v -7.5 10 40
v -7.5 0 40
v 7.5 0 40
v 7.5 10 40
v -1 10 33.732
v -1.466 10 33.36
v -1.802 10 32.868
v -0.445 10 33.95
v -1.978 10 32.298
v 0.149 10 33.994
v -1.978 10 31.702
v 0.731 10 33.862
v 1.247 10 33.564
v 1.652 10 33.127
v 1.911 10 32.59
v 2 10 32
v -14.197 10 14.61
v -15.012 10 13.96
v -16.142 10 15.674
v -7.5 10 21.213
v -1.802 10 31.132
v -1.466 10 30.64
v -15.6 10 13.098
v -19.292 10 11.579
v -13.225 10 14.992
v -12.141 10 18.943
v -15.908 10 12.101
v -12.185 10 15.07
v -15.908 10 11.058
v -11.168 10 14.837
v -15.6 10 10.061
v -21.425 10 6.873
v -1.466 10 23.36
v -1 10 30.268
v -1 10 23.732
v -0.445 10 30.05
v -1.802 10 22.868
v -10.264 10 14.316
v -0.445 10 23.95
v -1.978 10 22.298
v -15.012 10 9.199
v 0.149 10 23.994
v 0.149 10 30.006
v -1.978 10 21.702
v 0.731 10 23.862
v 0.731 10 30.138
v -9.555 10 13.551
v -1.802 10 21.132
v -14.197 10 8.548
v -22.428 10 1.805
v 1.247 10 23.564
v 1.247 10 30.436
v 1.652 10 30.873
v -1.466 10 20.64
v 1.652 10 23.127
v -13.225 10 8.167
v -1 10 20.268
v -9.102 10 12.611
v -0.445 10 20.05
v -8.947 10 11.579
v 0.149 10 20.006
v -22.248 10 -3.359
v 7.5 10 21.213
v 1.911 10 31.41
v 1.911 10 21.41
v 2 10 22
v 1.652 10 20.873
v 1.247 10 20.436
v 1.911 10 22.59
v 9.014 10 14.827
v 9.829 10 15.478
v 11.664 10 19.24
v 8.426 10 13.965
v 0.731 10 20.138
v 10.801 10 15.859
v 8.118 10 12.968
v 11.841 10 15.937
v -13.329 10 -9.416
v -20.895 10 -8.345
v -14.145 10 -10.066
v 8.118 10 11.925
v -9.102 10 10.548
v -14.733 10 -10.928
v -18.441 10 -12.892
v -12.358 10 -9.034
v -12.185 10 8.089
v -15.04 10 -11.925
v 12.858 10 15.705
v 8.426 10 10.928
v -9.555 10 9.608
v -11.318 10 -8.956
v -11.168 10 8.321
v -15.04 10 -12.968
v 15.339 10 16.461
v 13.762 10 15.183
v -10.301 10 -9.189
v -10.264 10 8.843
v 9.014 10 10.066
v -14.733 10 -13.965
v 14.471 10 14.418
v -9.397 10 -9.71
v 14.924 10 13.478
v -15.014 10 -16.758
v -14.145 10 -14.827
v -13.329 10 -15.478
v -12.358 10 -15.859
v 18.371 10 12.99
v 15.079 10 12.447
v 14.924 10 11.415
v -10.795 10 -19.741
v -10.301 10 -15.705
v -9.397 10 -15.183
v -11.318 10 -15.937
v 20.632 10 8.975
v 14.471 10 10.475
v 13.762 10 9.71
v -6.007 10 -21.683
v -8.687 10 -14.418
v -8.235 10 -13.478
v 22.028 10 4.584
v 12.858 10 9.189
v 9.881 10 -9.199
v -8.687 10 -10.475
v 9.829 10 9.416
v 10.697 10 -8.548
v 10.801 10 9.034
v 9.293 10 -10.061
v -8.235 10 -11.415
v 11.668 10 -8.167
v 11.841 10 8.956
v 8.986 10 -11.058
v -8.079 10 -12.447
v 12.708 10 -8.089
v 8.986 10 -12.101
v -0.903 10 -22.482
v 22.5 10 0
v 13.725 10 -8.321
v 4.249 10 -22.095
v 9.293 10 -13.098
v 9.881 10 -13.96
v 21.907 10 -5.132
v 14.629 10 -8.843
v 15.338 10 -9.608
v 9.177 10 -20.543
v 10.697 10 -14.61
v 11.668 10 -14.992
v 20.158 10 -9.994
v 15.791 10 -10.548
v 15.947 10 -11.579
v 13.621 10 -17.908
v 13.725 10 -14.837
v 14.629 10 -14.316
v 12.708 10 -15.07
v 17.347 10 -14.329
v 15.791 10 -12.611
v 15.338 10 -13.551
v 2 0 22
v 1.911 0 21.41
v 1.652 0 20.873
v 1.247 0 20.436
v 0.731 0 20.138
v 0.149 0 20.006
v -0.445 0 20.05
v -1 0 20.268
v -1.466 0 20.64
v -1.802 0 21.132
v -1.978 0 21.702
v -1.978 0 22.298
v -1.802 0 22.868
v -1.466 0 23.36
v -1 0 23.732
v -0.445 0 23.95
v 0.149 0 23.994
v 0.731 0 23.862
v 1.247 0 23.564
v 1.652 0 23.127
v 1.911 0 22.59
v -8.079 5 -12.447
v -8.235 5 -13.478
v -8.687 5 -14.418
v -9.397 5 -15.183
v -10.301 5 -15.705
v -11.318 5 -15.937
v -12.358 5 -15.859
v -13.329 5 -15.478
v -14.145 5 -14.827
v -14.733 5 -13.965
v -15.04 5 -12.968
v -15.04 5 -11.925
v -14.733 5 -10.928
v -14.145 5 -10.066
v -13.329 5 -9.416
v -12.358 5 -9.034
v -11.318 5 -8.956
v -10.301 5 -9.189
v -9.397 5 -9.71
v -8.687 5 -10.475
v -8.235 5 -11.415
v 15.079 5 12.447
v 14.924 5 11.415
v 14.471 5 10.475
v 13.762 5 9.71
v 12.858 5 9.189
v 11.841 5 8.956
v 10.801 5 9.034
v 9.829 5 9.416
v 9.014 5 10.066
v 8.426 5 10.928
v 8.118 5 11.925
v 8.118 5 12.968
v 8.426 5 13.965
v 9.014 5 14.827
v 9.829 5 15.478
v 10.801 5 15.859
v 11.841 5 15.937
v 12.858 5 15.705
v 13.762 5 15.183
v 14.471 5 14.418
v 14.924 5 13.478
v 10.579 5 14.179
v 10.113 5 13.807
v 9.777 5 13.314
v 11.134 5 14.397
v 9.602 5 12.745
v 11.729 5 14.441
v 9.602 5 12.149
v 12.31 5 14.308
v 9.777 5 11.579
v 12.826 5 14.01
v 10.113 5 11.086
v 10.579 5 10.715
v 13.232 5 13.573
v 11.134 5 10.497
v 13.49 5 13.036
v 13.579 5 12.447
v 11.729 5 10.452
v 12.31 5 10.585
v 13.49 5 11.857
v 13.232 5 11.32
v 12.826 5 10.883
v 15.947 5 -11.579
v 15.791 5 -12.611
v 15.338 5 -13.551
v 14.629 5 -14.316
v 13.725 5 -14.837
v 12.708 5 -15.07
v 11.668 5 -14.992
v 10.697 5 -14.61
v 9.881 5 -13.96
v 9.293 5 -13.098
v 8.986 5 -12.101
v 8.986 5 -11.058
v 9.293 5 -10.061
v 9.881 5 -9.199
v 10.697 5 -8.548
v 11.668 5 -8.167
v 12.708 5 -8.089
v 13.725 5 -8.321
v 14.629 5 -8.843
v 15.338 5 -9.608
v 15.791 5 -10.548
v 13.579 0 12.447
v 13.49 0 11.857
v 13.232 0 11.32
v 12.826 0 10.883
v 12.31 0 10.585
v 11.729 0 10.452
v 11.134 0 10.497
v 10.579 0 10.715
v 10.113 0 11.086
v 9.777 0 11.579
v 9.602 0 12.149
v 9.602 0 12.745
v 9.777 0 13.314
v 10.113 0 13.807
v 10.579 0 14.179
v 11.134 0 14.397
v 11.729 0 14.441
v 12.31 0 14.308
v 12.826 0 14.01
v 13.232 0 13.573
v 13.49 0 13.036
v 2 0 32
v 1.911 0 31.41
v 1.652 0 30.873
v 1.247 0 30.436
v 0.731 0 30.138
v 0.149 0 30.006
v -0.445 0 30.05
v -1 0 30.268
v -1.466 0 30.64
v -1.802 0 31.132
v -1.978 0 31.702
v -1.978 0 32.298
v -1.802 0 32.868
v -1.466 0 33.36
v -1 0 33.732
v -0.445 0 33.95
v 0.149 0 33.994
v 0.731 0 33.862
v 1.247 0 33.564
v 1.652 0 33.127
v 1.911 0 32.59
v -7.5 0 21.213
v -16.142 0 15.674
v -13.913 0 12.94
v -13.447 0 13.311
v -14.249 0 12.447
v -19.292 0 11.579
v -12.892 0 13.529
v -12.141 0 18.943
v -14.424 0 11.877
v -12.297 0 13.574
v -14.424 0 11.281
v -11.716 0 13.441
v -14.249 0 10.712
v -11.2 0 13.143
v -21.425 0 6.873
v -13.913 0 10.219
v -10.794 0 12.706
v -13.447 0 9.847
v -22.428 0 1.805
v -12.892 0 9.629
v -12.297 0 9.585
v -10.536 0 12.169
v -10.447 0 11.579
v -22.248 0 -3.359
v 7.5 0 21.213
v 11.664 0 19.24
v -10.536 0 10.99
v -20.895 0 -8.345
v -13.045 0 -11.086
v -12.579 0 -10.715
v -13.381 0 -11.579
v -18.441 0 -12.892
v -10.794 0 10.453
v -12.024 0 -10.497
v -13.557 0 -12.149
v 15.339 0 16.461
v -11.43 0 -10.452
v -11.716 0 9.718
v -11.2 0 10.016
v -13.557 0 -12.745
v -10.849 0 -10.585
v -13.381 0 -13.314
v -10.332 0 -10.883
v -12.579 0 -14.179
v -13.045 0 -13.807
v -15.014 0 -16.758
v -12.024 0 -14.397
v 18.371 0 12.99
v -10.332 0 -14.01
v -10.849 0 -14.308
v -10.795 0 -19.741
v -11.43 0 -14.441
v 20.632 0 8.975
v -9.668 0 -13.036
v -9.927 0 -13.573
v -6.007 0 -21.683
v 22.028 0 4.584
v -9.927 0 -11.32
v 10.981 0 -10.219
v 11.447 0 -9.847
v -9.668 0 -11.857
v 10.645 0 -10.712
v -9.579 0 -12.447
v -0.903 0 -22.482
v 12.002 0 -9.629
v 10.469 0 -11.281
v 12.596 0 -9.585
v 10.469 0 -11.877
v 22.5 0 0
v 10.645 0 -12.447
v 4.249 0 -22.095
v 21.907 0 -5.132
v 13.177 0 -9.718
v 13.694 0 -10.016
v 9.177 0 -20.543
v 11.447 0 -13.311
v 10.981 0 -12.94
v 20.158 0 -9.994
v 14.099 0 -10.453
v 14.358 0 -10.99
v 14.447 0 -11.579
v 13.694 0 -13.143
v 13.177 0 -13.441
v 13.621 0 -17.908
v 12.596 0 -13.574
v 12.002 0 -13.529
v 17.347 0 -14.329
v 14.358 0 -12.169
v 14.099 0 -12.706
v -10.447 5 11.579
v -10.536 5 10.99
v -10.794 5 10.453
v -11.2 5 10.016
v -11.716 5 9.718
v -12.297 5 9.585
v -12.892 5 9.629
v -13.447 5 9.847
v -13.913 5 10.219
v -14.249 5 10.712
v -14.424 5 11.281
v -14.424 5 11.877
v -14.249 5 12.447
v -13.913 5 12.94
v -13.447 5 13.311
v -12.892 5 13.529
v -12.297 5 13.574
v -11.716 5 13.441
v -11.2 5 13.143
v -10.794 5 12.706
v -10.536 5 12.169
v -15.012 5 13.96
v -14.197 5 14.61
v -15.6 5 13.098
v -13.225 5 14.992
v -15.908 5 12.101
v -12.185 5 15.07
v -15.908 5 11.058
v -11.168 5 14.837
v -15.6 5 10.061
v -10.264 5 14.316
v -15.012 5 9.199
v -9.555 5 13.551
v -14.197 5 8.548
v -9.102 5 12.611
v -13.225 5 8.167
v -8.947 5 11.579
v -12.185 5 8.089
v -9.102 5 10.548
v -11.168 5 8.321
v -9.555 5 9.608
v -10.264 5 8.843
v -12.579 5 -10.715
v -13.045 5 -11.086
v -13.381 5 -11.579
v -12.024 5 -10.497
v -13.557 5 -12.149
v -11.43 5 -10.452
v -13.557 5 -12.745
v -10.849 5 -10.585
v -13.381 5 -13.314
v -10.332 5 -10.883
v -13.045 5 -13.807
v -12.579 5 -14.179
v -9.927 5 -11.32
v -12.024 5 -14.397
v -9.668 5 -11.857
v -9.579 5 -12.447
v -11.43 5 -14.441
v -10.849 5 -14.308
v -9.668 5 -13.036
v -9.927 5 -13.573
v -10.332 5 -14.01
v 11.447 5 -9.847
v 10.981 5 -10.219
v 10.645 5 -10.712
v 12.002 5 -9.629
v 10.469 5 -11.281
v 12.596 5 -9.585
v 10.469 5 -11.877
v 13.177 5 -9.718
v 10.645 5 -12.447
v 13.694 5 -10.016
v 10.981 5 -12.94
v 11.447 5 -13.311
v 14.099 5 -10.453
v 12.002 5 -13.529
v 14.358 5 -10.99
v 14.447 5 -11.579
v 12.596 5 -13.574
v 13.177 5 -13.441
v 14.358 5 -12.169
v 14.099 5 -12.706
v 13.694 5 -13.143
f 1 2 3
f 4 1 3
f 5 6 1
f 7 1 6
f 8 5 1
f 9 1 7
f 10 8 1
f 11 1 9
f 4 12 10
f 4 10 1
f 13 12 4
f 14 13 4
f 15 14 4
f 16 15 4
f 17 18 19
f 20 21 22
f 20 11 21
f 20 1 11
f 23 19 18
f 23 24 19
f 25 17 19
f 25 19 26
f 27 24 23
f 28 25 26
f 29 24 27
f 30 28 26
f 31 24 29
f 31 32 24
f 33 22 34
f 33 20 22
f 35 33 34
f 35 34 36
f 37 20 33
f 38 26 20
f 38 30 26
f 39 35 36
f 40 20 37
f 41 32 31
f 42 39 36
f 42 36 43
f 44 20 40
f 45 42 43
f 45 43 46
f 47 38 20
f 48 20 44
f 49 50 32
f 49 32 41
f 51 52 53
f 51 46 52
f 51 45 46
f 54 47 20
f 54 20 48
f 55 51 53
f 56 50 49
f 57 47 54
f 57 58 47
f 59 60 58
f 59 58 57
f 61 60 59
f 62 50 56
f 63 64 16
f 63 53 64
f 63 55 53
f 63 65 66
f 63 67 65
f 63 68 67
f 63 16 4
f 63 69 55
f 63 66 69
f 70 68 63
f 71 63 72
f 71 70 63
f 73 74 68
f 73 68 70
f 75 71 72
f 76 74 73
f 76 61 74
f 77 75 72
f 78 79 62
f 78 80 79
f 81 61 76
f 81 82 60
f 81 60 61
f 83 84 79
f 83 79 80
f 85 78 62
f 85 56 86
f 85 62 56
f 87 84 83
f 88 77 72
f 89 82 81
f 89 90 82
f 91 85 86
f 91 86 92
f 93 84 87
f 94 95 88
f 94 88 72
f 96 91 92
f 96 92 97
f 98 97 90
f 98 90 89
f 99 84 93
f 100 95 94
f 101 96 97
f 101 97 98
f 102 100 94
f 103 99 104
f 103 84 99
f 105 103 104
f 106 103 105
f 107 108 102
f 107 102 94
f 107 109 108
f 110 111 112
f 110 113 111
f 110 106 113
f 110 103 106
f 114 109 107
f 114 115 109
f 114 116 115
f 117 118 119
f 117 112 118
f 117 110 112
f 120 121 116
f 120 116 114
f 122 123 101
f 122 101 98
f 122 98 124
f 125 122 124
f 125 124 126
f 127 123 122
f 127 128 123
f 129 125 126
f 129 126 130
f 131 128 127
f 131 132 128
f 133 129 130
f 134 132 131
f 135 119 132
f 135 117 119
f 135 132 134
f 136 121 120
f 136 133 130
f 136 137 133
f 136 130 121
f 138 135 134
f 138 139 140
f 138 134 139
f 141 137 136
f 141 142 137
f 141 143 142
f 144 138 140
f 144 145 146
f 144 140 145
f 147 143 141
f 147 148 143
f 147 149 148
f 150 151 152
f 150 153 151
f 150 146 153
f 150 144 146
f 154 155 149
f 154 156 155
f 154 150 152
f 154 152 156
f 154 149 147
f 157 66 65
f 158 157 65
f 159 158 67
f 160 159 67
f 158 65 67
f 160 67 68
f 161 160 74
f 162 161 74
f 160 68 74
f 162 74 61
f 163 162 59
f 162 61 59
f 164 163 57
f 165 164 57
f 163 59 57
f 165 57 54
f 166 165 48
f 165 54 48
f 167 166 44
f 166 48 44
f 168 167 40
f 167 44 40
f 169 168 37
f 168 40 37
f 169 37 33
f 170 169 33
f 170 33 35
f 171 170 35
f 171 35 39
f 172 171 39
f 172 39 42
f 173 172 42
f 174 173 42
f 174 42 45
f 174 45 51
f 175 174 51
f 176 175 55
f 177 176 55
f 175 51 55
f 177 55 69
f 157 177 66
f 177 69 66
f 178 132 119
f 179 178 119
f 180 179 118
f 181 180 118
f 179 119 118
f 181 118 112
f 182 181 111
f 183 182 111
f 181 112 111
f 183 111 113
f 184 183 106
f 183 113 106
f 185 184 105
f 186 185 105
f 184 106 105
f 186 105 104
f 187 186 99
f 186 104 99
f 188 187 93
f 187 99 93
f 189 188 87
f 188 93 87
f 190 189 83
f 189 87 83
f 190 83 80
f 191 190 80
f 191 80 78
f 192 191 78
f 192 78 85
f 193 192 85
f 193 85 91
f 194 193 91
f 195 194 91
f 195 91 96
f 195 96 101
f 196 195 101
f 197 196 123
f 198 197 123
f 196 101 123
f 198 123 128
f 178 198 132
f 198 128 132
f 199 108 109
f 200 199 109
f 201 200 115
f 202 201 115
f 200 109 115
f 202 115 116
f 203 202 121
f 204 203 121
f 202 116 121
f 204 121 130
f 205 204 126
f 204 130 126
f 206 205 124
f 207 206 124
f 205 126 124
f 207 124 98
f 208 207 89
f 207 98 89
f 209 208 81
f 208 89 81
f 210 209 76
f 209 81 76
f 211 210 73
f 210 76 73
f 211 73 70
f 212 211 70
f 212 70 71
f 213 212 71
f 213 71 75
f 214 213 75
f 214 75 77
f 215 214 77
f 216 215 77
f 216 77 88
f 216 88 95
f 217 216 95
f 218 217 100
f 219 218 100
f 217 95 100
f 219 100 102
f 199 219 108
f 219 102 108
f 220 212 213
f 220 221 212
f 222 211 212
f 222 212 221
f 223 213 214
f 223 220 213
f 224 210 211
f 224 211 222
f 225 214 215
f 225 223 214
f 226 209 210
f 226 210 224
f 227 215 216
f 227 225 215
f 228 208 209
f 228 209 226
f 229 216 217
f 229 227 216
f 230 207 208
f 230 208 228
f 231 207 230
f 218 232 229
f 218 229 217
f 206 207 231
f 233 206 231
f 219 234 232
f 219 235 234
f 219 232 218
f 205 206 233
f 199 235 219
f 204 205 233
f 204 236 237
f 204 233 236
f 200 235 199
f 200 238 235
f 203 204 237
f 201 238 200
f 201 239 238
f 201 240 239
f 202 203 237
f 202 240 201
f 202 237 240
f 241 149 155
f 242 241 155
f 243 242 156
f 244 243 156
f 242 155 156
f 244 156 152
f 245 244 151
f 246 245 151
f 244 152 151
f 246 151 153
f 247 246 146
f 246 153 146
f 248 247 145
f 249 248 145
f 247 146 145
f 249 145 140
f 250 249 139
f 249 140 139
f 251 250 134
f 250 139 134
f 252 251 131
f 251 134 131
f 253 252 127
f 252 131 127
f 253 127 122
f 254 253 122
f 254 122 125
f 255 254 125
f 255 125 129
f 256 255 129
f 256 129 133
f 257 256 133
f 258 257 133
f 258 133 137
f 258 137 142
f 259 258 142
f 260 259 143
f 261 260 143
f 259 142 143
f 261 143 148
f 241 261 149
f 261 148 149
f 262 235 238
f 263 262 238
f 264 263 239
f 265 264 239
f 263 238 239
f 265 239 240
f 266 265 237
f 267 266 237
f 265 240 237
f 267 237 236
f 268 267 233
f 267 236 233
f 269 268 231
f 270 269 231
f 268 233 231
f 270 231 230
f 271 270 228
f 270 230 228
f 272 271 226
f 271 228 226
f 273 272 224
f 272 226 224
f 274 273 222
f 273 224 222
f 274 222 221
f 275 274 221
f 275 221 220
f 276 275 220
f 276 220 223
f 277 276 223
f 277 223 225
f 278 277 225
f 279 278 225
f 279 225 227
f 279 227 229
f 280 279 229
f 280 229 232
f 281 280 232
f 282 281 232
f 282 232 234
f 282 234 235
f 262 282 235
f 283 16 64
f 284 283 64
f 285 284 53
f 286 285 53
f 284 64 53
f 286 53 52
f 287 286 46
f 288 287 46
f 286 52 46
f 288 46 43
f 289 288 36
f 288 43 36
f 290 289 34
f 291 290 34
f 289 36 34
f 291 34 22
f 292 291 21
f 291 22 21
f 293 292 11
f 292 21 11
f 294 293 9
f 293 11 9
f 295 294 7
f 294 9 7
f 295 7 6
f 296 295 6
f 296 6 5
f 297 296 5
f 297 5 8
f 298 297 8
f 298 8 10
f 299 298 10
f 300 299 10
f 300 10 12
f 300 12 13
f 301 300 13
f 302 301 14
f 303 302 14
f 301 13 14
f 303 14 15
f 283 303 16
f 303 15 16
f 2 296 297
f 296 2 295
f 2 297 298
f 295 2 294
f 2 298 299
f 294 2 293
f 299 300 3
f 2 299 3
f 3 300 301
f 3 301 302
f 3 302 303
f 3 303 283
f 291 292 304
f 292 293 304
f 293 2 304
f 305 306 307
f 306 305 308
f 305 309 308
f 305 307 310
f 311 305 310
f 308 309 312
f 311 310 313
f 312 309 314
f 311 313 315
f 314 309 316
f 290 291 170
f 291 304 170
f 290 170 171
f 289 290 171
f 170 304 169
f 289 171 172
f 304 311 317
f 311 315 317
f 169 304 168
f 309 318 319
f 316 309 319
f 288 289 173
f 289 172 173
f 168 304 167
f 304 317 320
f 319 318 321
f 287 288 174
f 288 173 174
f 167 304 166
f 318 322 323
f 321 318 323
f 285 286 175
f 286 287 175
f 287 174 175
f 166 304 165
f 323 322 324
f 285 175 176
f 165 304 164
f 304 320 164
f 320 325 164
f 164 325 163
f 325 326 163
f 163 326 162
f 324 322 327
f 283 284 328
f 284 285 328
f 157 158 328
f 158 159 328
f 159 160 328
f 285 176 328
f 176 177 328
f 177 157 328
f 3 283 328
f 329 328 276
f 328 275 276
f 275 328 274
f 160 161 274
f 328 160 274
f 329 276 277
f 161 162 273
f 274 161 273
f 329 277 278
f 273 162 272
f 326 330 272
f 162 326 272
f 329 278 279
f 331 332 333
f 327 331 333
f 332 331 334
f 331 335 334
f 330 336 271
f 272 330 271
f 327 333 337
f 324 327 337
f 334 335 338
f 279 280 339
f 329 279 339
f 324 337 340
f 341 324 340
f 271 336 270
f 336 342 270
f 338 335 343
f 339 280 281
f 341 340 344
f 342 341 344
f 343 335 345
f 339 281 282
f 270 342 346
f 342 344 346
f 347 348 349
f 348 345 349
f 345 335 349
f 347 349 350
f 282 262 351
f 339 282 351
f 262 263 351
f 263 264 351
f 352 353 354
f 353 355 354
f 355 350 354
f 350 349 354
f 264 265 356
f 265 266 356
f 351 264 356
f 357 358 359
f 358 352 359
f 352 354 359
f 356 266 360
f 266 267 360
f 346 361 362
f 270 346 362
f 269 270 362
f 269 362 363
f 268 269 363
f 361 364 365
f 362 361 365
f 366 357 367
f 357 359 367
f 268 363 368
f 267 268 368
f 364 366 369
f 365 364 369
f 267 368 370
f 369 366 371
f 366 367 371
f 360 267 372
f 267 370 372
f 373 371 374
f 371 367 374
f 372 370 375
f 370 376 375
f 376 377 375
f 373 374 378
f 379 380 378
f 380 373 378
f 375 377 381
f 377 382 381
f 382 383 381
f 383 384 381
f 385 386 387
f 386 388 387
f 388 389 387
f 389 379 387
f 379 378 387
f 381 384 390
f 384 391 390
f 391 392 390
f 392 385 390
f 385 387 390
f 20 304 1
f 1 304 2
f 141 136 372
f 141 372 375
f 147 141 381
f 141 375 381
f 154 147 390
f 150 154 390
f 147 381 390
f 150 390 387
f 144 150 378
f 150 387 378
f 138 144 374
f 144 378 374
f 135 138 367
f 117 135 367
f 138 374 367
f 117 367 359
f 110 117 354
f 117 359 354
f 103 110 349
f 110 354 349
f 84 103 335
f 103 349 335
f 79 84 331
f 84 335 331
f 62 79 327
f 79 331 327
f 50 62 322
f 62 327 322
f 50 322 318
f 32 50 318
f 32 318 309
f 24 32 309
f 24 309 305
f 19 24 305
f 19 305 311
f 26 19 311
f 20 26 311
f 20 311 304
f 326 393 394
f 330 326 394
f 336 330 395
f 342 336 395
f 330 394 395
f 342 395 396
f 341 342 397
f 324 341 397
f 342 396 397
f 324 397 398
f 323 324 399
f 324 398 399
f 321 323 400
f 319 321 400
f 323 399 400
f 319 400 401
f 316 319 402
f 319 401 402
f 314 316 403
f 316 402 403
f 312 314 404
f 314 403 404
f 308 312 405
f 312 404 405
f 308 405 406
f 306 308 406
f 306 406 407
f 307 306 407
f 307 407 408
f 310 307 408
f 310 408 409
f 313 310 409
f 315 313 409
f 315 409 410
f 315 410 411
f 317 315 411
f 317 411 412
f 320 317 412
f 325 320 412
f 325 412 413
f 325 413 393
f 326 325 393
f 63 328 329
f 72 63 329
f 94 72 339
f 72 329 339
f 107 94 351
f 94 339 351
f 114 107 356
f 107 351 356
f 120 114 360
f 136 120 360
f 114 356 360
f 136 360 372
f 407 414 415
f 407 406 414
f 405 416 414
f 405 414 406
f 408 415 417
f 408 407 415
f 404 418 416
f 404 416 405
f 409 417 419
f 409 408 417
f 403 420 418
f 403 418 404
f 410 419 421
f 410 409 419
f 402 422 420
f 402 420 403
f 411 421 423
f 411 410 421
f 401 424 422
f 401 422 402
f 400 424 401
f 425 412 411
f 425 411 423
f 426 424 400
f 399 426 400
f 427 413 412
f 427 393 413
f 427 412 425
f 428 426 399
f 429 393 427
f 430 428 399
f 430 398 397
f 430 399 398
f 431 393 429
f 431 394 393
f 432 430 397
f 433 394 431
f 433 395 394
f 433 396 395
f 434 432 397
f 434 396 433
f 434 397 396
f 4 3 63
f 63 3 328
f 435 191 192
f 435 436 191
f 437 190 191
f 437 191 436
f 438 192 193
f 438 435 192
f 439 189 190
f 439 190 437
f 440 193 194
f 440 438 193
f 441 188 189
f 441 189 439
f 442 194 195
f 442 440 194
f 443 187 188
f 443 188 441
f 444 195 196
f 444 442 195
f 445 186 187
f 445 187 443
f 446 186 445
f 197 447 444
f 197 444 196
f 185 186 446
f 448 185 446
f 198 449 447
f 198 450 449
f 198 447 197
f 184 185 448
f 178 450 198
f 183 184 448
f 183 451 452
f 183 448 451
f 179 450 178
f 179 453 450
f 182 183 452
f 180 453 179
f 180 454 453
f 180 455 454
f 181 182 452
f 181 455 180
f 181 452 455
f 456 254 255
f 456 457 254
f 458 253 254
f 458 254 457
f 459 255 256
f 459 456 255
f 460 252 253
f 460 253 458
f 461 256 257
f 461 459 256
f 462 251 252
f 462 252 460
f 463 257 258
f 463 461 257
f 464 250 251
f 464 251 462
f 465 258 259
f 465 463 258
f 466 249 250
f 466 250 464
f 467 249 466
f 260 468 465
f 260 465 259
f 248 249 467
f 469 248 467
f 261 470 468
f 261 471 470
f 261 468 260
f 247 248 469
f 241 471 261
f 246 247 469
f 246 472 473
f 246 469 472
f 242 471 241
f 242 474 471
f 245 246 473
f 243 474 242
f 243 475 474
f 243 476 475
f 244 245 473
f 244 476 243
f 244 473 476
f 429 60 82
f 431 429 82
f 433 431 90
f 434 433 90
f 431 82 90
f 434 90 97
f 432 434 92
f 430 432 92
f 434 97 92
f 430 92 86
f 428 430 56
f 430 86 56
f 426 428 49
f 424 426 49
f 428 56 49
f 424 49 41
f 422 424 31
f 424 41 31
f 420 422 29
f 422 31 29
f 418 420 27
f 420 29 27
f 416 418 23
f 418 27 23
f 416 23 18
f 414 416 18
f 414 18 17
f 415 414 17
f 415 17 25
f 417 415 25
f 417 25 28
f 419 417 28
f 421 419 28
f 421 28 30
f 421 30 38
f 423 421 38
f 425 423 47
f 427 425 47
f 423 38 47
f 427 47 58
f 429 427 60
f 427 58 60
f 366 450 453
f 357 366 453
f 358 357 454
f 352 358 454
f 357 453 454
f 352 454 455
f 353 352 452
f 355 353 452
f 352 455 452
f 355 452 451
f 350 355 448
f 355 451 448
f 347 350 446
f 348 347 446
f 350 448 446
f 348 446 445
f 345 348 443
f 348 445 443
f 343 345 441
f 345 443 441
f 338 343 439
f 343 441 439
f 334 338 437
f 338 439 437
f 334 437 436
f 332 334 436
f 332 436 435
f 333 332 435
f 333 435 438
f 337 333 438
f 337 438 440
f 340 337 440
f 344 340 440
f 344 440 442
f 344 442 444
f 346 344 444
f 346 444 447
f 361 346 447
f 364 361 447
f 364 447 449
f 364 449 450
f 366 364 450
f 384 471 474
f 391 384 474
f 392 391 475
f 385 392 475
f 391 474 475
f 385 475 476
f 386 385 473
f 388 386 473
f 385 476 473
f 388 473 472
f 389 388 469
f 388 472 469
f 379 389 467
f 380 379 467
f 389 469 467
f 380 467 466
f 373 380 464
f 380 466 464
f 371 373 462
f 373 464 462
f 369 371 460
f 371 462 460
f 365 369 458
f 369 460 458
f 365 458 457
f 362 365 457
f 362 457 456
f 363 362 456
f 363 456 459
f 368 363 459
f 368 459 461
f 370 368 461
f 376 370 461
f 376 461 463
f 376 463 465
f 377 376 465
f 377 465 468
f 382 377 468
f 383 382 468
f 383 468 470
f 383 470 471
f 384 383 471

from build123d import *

# Parameters (mm, degrees)
BOSS_EXTRUDE1_DEPTH = 10
SKETCH2_R           = 2
CUT_EXTRUDE1_DEPTH  = 10
SKETCH3_R           = 2
CUT_EXTRUDE2_DEPTH  = 10
SKETCH4_R           = 3.5
CUT_EXTRUDE3_DEPTH  = 5


with BuildPart() as part:
    # Sketch1 → Boss-Extrude1 (new body)
    with BuildSketch(Plane(origin=(0, 0, 0), x_dir=(1, 0, 0), z_dir=(0, 1, 0))):
        with BuildLine():
            ThreePointArc((7.5, -21.213203436), (0, -22.5), (-7.5, -21.213203436))
            Line((-7.5, -21.213203436), (-7.5, -40))
            Line((-7.5, -40), (7.5, -40))
            Line((7.5, -40), (7.5, -21.213203436))
        make_face()
        with BuildLine():
            Line((-7.5, -21.213203436), (-7.5, 0))
            Line((-7.5, 0), (7.5, 0))
            Line((7.5, 0), (7.5, -21.213203436))
            ThreePointArc((7.5, -21.213203436), (18.371173071, -12.990381057), (22.5, 0))
            ThreePointArc((22.5, 0), (-12.990381057, 18.371173071), (-7.5, -21.213203436))
        make_face()
        with BuildLine():
            Line((7.5, 0), (-7.5, 0))
            Line((-7.5, 0), (-7.5, -21.213203436))
            ThreePointArc((-7.5, -21.213203436), (0, -22.5), (7.5, -21.213203436))
            Line((7.5, -21.213203436), (7.5, 0))
        make_face()
    extrude(amount=BOSS_EXTRUDE1_DEPTH)

    # Sketch2 → Cut-Extrude1 (cut)
    with BuildSketch(Plane(origin=(0, 10, 0), x_dir=(1, 0, 0), z_dir=(0, 1, 0))):
        with Locations((-11.579332818, 12.446648203)):
            Circle(SKETCH2_R)
        with Locations((12.446648203, 11.579332818)):
            Circle(SKETCH2_R)
        with Locations((11.579332818, -12.446648203)):
            Circle(SKETCH2_R)
        with Locations((-12.446648203, -11.579332818)):
            Circle(SKETCH2_R)
    extrude(amount=-CUT_EXTRUDE1_DEPTH, mode=Mode.SUBTRACT)

    # Sketch3 → Cut-Extrude2 (cut)
    with BuildSketch(Plane(origin=(0, 10, 0), x_dir=(1, 0, 0), z_dir=(0, 1, 0))):
        with Locations((0, -22)):
            Circle(SKETCH3_R)
        with Locations((0, -32)):
            Circle(SKETCH3_R)
    extrude(amount=-CUT_EXTRUDE2_DEPTH, mode=Mode.SUBTRACT)

    # Sketch4 → Cut-Extrude3 (cut)
    with BuildSketch(Plane(origin=(0, 10, 0), x_dir=(1, 0, 0), z_dir=(0, 1, 0))):
        with Locations((-11.579332818, 12.446648203)):
            Circle(SKETCH4_R)
        with Locations((12.446648203, 11.579332818)):
            Circle(SKETCH4_R)
        with Locations((11.579332818, -12.446648203)):
            Circle(SKETCH4_R)
        with Locations((-12.446648203, -11.579332818)):
            Circle(SKETCH4_R)
    extrude(amount=-CUT_EXTRUDE3_DEPTH, mode=Mode.SUBTRACT)


solid = part.part
